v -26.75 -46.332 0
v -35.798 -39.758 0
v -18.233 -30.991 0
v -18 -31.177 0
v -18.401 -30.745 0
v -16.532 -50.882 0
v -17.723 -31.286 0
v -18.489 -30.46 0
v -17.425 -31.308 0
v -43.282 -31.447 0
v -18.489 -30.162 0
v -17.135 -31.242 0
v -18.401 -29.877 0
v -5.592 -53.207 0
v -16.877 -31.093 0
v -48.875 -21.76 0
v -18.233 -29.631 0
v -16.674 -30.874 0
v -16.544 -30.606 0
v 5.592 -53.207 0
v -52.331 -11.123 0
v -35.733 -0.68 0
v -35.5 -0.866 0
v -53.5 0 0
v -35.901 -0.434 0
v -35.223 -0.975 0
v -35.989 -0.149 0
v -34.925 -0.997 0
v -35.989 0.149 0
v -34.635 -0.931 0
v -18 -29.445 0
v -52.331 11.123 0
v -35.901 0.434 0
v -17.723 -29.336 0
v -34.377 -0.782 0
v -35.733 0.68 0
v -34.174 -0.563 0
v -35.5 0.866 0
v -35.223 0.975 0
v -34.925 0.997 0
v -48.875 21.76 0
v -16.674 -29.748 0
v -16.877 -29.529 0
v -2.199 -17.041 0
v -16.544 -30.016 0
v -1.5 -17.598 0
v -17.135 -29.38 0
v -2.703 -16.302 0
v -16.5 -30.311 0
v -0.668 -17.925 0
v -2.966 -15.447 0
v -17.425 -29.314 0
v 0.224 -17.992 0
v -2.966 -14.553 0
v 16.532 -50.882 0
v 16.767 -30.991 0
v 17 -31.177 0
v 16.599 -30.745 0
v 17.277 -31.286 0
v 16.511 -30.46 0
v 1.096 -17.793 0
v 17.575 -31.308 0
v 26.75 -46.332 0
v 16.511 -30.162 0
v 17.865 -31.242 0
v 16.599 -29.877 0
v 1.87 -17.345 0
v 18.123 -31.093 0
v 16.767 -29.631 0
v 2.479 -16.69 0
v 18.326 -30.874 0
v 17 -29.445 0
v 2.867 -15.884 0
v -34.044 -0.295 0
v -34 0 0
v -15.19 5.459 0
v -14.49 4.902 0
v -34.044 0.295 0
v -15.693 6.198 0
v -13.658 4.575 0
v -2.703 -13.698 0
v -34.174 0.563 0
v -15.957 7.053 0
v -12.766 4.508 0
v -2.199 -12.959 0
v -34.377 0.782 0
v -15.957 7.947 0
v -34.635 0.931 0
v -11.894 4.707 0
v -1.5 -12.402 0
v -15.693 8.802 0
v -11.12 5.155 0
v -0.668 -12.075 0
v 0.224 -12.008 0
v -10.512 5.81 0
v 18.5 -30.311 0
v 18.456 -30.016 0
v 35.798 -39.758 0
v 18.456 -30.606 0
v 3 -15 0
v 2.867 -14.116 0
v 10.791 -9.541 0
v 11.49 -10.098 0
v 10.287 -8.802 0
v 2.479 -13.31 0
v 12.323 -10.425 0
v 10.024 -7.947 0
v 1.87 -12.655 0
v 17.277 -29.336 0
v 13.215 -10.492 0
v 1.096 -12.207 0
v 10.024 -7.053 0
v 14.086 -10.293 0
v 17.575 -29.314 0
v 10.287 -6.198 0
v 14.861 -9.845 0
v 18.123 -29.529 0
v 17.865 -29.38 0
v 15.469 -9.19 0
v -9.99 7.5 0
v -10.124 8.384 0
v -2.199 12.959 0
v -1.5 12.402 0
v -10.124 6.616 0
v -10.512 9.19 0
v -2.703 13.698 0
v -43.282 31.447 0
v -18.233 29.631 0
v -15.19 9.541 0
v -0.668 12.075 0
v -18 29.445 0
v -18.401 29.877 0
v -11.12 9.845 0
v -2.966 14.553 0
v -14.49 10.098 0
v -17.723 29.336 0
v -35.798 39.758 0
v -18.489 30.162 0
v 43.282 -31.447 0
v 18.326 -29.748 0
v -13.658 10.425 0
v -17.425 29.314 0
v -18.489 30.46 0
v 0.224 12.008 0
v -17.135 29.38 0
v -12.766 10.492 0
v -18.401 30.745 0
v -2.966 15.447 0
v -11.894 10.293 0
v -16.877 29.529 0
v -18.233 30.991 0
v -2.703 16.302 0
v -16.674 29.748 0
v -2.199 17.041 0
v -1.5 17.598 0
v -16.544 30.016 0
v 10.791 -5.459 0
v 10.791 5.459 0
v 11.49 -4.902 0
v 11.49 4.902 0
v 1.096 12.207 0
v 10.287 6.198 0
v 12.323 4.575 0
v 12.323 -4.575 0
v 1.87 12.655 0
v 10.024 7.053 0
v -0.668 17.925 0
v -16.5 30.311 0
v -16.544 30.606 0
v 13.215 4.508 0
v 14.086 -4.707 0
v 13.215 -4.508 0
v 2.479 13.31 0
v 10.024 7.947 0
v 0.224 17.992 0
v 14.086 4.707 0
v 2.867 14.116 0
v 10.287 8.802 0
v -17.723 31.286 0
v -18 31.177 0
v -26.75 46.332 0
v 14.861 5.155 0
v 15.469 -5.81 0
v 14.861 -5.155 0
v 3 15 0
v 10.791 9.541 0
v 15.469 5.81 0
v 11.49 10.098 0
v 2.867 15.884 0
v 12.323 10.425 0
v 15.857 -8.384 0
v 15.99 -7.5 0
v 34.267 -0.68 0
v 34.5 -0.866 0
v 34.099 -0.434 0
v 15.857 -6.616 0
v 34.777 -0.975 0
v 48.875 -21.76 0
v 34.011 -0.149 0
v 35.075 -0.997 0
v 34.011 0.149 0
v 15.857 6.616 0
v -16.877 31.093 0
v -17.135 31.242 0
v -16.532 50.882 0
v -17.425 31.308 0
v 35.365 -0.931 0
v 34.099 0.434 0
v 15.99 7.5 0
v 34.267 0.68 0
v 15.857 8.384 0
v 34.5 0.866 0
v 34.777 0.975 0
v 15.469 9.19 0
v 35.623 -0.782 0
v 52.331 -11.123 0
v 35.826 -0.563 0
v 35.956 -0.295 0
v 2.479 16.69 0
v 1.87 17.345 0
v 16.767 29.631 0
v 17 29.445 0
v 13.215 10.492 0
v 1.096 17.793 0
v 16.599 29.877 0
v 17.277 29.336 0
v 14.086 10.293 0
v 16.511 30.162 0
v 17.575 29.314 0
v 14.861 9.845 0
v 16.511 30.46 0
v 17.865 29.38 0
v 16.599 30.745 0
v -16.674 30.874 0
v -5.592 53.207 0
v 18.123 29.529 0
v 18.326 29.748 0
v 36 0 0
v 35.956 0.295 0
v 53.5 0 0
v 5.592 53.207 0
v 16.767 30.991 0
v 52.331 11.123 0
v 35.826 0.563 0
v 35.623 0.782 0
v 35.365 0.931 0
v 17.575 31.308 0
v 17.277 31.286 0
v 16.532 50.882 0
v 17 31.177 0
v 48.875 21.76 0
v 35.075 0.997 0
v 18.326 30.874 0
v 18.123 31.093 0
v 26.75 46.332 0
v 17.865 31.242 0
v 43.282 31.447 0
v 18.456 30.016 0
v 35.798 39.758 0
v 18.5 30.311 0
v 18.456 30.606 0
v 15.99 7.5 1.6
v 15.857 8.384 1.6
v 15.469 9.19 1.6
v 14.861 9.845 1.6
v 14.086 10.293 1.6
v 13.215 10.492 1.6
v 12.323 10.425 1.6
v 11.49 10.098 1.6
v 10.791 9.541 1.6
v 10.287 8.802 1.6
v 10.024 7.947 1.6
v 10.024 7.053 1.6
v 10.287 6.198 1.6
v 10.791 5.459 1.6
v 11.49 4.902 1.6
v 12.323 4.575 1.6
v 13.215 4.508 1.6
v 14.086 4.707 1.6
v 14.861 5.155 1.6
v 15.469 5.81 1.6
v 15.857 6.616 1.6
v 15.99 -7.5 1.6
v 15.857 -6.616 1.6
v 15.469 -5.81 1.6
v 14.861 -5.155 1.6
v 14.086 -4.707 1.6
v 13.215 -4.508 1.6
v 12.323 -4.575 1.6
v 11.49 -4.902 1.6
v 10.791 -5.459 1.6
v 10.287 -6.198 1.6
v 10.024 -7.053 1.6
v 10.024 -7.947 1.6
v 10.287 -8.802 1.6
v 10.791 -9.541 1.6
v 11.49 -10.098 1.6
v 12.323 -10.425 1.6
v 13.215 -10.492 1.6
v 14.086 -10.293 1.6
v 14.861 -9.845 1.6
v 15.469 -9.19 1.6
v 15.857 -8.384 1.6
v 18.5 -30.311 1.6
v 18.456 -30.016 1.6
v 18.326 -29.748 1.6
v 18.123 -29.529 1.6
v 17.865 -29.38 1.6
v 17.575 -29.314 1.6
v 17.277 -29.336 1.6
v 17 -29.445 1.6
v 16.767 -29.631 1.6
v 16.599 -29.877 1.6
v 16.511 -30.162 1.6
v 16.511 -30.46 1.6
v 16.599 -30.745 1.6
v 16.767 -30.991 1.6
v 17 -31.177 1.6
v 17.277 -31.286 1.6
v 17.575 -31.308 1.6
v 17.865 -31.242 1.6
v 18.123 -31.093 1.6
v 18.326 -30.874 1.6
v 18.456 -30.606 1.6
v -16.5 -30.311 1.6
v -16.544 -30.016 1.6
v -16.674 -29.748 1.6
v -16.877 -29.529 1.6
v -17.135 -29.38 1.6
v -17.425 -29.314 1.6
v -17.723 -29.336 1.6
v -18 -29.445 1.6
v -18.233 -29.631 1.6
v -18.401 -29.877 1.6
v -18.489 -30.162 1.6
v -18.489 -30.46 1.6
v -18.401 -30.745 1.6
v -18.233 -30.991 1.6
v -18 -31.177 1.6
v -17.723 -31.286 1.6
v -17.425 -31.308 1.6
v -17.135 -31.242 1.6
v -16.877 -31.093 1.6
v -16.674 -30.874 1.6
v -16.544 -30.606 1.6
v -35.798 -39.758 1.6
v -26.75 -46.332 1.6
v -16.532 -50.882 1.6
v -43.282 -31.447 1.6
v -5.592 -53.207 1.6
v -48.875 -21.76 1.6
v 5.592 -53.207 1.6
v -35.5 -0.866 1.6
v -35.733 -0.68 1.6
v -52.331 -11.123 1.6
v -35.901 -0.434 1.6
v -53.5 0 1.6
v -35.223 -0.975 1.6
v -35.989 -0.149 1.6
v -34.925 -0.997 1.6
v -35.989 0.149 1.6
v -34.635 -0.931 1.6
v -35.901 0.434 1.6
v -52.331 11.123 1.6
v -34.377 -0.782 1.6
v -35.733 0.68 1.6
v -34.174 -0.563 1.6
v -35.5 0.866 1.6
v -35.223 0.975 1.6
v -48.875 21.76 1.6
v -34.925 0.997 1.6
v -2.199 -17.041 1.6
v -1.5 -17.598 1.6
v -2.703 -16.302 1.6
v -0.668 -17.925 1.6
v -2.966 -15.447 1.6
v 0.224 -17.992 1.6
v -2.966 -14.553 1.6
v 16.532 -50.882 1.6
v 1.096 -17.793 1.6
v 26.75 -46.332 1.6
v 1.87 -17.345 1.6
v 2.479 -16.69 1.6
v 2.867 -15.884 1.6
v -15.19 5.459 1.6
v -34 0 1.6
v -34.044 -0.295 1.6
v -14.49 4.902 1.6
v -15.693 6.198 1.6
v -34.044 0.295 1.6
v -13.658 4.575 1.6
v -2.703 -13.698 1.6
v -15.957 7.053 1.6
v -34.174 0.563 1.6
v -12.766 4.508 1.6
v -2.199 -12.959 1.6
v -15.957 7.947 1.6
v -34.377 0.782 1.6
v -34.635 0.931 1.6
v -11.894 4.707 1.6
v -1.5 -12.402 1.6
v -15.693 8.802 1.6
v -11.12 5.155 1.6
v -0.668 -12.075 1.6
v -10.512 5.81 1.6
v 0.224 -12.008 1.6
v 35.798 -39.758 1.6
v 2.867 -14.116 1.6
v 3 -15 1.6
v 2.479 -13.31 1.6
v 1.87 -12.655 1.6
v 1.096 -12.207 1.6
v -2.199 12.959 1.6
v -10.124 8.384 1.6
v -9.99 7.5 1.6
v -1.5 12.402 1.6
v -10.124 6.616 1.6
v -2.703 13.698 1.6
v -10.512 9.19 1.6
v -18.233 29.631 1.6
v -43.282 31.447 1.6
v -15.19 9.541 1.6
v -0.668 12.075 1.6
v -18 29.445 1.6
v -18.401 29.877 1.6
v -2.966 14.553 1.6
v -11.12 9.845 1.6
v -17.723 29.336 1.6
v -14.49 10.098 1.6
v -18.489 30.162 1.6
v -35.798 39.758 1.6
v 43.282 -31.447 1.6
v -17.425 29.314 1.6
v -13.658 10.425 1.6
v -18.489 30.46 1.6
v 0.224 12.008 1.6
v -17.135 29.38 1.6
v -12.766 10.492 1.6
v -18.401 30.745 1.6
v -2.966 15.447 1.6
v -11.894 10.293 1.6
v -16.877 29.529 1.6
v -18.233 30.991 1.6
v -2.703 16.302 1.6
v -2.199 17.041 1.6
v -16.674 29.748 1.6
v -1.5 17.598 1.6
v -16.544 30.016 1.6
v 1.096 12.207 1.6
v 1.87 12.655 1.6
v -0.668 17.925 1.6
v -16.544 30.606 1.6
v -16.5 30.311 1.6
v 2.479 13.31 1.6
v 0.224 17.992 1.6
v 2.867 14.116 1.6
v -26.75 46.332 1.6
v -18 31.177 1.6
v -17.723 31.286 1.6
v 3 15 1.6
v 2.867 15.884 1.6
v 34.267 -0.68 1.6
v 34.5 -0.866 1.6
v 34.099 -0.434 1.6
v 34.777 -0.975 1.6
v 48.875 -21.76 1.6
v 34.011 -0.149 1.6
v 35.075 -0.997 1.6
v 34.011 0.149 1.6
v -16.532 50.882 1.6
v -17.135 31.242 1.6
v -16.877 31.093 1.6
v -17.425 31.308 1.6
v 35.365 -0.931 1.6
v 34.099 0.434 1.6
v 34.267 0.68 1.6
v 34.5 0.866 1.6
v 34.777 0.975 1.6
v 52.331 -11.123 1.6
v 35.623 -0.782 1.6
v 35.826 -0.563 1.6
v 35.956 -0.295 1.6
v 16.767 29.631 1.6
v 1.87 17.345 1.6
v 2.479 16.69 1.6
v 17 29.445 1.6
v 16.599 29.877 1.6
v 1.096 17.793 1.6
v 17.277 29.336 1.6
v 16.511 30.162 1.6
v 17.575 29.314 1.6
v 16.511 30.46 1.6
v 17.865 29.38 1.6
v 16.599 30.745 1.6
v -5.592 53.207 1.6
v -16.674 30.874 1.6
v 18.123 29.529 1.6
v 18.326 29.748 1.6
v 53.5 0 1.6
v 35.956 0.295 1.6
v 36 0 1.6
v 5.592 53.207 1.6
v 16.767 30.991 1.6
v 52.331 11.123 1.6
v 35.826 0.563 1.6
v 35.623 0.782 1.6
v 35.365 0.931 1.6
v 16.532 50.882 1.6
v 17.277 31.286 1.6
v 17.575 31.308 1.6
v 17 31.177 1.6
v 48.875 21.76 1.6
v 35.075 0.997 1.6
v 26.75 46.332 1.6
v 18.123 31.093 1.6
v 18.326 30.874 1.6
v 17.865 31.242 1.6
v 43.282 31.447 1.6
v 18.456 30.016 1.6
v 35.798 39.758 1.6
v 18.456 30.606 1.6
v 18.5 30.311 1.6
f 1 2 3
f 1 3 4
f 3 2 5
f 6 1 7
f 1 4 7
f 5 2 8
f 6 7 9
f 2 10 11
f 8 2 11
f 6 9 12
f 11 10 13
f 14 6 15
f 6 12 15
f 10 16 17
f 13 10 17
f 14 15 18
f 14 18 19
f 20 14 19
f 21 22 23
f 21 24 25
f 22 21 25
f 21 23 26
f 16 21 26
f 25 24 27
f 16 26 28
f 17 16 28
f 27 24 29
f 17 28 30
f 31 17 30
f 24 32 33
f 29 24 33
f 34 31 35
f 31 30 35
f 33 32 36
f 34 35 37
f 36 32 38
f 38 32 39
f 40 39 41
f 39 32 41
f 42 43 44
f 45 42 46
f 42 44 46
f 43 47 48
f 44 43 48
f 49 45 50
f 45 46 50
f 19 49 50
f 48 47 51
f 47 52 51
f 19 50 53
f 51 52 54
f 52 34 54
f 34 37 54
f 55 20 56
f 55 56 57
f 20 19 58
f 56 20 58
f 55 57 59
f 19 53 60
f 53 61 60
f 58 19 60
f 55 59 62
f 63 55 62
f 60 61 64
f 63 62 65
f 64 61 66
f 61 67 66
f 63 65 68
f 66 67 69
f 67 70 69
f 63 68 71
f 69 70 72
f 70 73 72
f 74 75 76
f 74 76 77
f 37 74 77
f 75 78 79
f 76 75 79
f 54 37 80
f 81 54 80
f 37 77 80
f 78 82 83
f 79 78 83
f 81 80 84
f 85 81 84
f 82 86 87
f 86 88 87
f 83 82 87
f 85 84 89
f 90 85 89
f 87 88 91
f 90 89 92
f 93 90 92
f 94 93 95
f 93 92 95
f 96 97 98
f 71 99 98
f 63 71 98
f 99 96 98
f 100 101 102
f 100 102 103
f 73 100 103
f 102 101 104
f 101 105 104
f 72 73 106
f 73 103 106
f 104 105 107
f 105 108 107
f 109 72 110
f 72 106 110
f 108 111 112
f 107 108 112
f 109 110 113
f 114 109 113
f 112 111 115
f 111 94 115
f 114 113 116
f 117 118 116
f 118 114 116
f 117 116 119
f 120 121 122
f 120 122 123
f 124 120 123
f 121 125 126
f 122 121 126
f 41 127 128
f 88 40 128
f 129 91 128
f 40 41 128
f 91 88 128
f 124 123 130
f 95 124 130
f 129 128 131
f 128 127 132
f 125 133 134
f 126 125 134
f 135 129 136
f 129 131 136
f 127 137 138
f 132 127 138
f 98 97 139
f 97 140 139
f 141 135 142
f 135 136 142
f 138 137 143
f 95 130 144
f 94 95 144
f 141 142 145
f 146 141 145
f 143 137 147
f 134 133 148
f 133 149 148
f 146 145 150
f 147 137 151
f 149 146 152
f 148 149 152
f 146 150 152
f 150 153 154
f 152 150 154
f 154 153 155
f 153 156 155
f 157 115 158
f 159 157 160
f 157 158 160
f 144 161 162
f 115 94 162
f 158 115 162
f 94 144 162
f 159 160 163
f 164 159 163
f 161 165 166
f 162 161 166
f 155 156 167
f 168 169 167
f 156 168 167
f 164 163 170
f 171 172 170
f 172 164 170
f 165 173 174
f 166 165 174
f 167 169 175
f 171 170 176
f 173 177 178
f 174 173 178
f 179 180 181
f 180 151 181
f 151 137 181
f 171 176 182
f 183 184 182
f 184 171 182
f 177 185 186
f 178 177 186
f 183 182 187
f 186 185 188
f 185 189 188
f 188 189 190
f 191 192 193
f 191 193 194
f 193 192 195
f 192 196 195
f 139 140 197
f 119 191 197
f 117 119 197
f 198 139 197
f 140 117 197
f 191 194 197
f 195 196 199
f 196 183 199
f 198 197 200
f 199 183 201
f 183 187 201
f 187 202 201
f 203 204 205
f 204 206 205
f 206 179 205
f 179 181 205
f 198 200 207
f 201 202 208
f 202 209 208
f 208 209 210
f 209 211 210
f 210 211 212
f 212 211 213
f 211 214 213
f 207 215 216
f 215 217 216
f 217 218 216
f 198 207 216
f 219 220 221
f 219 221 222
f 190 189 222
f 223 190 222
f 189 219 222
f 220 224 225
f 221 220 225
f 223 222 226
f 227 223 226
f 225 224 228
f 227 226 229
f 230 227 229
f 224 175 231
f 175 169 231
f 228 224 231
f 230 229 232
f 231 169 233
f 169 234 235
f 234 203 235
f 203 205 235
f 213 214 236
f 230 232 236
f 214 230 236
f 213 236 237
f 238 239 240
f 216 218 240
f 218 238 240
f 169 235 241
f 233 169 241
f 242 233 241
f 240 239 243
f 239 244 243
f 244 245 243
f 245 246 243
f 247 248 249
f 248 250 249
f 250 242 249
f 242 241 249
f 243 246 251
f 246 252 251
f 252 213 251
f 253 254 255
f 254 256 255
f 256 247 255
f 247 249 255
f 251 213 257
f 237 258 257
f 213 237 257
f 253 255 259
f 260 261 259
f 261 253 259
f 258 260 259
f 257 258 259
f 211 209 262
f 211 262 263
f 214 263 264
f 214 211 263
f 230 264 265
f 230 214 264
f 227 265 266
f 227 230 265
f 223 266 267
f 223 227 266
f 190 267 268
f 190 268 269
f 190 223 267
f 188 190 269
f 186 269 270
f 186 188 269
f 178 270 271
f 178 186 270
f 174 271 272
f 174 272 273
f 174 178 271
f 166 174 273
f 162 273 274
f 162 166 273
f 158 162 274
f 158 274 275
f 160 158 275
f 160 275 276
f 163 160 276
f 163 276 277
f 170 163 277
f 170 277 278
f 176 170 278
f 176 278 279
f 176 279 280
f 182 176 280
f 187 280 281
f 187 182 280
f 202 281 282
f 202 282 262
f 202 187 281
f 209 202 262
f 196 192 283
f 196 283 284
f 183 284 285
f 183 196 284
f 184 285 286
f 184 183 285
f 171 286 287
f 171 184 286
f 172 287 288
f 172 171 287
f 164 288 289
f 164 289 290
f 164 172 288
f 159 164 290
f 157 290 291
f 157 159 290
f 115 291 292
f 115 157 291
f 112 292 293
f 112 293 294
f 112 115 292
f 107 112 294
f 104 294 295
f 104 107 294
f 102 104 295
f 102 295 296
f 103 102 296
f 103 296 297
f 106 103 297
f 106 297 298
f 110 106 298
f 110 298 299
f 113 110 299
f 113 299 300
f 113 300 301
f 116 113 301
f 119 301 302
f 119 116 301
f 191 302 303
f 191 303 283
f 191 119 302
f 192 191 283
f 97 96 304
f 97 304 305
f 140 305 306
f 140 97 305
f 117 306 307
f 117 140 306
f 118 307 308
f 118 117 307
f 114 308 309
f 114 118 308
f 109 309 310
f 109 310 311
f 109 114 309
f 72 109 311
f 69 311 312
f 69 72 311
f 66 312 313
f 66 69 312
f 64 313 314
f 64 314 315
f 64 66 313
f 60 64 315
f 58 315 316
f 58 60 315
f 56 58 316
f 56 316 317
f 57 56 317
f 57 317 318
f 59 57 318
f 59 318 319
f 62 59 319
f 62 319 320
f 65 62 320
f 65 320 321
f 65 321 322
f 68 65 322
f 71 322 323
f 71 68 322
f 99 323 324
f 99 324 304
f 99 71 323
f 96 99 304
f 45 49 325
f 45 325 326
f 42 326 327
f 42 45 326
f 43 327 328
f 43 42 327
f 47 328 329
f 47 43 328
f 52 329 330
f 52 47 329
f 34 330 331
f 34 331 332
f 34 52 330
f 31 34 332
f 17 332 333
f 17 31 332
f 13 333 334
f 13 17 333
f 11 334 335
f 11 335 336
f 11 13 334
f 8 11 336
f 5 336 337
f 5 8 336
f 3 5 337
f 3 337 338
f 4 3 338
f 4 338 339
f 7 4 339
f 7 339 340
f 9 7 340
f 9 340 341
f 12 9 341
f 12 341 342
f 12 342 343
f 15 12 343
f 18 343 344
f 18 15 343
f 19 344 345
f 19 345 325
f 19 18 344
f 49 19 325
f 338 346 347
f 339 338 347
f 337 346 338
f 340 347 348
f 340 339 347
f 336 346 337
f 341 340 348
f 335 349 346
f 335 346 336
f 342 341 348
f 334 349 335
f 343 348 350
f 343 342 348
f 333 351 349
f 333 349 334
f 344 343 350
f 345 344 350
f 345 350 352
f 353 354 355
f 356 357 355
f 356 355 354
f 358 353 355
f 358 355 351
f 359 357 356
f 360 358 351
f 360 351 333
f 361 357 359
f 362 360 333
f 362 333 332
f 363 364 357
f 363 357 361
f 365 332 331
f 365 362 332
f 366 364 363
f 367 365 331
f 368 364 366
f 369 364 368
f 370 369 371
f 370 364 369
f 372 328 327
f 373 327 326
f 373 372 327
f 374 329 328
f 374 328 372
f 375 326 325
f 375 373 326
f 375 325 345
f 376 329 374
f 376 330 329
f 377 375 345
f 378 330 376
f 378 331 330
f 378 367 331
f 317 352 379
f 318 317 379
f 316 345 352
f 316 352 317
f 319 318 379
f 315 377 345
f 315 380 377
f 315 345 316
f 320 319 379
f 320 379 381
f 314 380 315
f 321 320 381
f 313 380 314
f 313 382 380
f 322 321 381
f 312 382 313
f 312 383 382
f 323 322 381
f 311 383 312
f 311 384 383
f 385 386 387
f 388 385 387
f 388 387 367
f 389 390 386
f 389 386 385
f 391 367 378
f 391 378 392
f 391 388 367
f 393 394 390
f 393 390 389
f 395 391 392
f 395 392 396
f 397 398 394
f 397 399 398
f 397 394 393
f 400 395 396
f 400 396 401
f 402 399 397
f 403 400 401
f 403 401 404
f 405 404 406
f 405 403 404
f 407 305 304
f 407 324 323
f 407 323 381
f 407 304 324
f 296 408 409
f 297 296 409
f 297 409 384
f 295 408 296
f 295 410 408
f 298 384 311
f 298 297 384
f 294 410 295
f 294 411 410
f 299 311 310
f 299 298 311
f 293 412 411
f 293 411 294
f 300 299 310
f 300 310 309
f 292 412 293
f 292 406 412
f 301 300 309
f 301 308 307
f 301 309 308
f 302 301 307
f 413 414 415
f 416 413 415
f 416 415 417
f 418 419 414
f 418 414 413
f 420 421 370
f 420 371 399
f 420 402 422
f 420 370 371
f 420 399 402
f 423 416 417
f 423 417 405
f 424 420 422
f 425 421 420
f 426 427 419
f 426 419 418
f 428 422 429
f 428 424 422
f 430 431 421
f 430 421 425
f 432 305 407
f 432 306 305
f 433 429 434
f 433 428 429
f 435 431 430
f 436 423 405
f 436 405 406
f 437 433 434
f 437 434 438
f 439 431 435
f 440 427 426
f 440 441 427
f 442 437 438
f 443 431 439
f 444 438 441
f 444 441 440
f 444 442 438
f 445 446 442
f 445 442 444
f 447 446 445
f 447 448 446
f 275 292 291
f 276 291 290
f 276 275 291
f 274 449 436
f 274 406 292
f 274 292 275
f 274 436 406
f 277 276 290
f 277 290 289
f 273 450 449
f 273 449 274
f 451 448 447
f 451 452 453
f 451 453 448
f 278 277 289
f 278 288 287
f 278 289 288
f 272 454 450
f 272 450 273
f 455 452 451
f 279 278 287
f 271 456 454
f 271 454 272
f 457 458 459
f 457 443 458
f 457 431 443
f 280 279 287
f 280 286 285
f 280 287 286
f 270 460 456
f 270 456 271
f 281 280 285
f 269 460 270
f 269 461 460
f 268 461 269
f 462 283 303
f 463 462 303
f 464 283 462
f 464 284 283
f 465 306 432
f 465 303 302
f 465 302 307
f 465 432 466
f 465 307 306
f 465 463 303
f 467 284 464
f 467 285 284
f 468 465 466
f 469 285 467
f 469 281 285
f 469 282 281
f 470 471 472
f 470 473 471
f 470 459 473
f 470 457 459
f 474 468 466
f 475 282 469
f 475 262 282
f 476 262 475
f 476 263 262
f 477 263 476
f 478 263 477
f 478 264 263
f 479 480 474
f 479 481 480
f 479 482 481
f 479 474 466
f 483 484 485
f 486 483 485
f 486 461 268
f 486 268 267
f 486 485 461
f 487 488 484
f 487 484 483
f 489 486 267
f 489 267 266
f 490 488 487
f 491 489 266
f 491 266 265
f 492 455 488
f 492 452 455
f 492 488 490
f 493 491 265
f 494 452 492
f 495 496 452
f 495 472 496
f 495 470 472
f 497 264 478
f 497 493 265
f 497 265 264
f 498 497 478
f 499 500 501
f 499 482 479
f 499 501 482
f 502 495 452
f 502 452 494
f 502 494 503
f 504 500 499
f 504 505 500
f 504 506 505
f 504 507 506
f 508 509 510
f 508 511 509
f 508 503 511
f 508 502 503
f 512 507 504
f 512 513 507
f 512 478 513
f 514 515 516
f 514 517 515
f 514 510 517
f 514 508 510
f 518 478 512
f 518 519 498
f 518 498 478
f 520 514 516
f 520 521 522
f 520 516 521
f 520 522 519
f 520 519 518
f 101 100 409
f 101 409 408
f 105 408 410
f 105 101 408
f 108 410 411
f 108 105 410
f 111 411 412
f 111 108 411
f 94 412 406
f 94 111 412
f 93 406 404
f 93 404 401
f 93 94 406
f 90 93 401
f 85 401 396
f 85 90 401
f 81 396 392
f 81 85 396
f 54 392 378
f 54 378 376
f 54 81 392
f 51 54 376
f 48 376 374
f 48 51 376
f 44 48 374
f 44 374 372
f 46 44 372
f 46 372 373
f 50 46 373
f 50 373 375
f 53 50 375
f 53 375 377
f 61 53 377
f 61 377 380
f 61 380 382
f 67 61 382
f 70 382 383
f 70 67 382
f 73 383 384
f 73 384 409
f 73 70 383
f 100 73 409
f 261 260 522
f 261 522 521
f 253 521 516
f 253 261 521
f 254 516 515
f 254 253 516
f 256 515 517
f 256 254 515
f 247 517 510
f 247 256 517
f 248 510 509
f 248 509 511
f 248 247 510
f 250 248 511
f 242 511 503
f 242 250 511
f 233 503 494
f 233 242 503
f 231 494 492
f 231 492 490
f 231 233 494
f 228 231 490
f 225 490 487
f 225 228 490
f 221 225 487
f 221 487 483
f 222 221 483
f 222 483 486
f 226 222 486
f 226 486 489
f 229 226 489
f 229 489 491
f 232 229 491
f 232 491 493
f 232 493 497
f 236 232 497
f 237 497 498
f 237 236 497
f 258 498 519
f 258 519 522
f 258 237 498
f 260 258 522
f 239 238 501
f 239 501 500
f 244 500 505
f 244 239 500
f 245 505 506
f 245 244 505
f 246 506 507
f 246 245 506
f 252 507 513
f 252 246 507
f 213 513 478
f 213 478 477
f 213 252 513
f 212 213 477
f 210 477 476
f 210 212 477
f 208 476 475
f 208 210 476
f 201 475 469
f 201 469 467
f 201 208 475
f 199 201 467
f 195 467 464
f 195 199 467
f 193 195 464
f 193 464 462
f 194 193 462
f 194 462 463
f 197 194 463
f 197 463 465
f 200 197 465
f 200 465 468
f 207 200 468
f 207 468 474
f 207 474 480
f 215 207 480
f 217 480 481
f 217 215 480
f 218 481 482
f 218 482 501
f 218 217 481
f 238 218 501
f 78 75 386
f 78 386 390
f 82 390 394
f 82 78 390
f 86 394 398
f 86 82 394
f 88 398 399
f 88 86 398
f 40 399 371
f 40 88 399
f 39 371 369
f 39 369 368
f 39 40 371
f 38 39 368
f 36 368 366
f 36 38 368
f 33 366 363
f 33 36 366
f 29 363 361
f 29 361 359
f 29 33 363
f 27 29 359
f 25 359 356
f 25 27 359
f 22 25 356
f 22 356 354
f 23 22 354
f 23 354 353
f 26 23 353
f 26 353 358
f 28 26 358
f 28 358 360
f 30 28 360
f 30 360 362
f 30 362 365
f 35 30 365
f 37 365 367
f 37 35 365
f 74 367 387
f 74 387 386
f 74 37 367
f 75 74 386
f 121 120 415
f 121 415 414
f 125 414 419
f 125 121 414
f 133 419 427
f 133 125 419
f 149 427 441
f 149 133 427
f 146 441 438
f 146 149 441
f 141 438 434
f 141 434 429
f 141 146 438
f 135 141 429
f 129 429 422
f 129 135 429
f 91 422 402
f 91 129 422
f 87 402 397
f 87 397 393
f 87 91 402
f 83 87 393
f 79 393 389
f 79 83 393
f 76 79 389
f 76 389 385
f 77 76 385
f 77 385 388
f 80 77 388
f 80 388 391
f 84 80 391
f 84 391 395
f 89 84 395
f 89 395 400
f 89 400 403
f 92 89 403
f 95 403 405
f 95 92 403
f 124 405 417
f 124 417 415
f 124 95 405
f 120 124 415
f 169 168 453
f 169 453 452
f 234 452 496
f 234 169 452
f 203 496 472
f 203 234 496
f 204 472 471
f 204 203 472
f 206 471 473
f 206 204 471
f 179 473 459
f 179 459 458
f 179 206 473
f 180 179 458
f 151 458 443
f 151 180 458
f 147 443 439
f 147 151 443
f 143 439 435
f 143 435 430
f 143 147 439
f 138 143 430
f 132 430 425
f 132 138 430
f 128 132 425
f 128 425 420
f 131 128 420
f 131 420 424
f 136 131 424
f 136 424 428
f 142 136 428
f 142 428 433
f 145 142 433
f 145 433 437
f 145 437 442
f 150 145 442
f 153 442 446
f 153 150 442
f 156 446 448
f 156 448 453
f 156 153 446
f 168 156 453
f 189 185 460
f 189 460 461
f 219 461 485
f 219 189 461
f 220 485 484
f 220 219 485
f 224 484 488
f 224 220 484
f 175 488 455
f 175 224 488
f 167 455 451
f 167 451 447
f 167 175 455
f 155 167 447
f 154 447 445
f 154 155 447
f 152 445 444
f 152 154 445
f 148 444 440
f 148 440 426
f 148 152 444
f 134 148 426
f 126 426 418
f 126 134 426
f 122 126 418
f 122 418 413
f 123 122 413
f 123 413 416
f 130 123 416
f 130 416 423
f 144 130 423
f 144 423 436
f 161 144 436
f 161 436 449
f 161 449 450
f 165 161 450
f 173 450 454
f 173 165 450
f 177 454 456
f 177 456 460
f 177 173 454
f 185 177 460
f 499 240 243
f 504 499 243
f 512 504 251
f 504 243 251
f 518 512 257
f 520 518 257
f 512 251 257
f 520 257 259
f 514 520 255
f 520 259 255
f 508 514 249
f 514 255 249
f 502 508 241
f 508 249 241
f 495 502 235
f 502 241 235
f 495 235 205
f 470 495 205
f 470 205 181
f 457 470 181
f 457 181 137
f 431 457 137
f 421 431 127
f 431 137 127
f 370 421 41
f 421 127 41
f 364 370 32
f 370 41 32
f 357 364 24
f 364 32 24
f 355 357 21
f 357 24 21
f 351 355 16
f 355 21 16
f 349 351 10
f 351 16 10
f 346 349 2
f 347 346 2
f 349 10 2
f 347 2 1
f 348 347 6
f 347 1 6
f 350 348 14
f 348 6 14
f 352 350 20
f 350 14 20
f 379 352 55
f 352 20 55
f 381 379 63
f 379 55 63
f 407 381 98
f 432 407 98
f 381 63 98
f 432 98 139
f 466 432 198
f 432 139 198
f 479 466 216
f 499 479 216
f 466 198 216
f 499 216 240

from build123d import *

# Parameters (mm, degrees)
ESQUISSE1_R        = 53.5
ESQUISSE1_R_2      = 1
ESQUISSE1_R_3      = 3
BOSS_EXTRU_1_DEPTH = 1.6


with BuildPart() as part:
    # Esquisse1 → Boss.-Extru.1 (new body)
    with BuildSketch(Plane.XY):
        Circle(ESQUISSE1_R)
        with Locations((35, 0)):
            Circle(ESQUISSE1_R_2, mode=Mode.SUBTRACT)
        with Locations((17.5, -30.310889132)):
            Circle(ESQUISSE1_R_2, mode=Mode.SUBTRACT)
        with Locations((-17.5, -30.310889132)):
            Circle(ESQUISSE1_R_2, mode=Mode.SUBTRACT)
        with Locations((-35, 0)):
            Circle(ESQUISSE1_R_2, mode=Mode.SUBTRACT)
        with Locations((-17.5, 30.310889132)):
            Circle(ESQUISSE1_R_2, mode=Mode.SUBTRACT)
        with Locations((17.5, 30.310889132)):
            Circle(ESQUISSE1_R_2, mode=Mode.SUBTRACT)
        with Locations((0, -15)):
            Circle(ESQUISSE1_R_3, mode=Mode.SUBTRACT)
        with Locations((12.990381057, -7.5)):
            Circle(ESQUISSE1_R_3, mode=Mode.SUBTRACT)
        with Locations((12.990381057, 7.5)):
            Circle(ESQUISSE1_R_3, mode=Mode.SUBTRACT)
        with Locations((0, 15)):
            Circle(ESQUISSE1_R_3, mode=Mode.SUBTRACT)
        with Locations((-12.990381057, 7.5)):
            Circle(ESQUISSE1_R_3, mode=Mode.SUBTRACT)
    extrude(amount=BOSS_EXTRU_1_DEPTH)


solid = part.part
